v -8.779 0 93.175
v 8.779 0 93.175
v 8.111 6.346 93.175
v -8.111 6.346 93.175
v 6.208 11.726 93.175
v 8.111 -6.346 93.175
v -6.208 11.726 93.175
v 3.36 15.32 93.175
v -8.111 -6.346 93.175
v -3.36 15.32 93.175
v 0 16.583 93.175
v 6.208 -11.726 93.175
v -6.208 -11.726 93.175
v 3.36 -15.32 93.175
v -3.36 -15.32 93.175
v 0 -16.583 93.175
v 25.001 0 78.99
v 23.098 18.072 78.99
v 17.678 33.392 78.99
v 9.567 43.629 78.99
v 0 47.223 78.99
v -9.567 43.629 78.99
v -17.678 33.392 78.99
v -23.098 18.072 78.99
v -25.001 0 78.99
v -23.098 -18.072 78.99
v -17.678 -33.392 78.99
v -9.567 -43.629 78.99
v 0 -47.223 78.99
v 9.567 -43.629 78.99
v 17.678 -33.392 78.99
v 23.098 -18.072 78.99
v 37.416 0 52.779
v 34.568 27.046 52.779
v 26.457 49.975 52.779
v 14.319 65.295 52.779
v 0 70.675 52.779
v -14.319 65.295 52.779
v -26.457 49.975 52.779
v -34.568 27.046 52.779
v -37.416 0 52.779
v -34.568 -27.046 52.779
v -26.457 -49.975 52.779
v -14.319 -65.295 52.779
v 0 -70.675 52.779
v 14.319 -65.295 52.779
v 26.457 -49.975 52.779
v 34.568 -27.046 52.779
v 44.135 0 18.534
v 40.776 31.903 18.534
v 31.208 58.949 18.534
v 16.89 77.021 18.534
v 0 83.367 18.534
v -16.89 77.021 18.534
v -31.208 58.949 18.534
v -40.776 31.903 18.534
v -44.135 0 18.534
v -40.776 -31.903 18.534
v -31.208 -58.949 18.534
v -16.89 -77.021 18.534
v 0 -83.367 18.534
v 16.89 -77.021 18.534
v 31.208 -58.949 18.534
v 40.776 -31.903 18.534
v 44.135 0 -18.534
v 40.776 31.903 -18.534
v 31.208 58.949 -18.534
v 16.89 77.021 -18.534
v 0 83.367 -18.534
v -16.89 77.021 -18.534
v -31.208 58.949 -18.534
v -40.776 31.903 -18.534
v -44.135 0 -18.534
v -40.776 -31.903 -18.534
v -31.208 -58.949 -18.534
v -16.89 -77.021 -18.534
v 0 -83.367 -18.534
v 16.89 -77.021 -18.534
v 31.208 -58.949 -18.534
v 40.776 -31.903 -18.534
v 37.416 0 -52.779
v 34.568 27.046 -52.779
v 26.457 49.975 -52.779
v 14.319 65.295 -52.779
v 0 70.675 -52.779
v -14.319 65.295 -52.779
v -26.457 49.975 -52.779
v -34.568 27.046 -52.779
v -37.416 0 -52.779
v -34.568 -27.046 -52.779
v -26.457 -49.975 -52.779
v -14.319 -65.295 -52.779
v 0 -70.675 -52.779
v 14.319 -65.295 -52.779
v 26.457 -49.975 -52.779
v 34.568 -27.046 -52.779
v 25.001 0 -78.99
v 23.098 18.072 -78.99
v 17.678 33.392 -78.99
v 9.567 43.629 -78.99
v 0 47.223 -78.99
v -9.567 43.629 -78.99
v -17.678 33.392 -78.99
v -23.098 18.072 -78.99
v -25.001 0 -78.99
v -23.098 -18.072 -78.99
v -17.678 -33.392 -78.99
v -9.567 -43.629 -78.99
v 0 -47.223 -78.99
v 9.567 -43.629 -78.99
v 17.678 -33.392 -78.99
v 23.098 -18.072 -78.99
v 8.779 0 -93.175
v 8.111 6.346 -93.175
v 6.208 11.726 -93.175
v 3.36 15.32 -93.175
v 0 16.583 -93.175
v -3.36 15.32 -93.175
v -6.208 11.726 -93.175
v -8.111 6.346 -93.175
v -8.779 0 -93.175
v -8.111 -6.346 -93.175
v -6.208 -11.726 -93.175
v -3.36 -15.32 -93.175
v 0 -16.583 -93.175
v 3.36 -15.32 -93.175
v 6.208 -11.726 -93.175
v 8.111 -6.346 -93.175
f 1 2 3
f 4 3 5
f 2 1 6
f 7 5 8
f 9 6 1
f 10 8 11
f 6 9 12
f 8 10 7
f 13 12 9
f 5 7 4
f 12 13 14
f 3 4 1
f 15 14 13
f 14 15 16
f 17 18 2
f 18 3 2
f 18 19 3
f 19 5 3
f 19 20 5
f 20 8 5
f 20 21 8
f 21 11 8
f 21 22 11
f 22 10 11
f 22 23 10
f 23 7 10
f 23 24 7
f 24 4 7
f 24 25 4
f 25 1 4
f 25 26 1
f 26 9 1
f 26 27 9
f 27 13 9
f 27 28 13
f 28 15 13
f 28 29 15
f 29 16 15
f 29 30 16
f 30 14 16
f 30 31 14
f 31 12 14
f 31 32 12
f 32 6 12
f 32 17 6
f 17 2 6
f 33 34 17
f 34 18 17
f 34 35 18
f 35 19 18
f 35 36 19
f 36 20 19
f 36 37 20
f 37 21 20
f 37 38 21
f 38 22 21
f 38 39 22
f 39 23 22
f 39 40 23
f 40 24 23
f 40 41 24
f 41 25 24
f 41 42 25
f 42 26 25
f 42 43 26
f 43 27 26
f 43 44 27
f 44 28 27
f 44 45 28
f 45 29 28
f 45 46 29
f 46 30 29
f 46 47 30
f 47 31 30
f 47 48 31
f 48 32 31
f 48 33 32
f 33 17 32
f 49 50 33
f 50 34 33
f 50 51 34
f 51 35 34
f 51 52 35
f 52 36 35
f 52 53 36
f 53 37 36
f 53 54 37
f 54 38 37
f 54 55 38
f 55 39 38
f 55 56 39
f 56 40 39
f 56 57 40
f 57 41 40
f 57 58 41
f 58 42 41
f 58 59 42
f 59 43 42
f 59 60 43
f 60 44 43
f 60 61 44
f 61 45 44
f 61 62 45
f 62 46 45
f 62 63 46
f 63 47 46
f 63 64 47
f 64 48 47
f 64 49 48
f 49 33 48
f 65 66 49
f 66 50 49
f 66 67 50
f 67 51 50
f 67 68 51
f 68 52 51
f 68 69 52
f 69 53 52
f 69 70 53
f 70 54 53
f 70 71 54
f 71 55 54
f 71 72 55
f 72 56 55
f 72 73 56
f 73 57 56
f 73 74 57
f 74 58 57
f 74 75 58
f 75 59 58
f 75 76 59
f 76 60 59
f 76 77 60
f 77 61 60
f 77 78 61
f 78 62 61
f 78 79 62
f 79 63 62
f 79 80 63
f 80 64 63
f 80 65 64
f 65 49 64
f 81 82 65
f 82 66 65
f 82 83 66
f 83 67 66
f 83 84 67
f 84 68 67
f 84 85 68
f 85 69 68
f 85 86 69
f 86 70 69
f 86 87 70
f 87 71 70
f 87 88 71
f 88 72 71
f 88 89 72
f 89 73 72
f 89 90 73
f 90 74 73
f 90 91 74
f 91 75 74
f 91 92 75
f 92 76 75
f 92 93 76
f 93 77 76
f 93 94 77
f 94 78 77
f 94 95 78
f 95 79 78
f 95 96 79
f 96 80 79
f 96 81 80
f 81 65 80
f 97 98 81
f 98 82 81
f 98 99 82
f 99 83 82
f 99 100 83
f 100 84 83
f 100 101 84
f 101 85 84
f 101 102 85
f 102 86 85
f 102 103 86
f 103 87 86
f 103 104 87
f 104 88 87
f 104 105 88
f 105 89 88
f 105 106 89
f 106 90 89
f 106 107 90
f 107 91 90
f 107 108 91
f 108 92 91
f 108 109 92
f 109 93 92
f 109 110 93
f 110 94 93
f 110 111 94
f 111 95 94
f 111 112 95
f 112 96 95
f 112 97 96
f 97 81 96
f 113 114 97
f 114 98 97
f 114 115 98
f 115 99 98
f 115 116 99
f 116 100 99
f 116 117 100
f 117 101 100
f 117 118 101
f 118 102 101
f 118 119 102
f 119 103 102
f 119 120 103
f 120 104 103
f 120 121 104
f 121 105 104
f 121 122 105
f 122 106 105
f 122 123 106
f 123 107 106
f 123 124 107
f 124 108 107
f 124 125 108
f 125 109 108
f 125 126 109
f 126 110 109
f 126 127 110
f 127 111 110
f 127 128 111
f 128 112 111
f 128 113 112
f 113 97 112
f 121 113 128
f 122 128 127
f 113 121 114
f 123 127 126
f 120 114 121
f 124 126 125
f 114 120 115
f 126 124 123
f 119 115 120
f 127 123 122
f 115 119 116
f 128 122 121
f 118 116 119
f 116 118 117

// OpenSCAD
// Generated by SolidPython 1.0.1 on 2020-07-29 00:46:49


scale(v = [9, 17, 19]) {
	sphere(r = 5);
}
/***********************************************
*********      SolidPython code:      **********
************************************************
 
# import packages: SolidPython
from solid import *
from solid.utils import *
from itertools import chain, combinations, permutations


class Resize:

    def __init__(self, scad_file):
        self.scad_file = scad_file
        #self.scad_file = import_scad(scad_file)
        # cone/cylinder param:
        self.r1 = 0
        self.r2 = 0
        self.h = 0
        # rectangular prism param:
        self.w = 0
        self.l = 0
        # ellipse param:
        self.r = 0

    # import OpenScad code (file name corresponds to shape)


    # classify shape + parameters
    def assign(self, param1, param2, param3):
        if self.scad_file == 'cone.scad':
            self.r1 = param1
            self.r2 = param2
            self.h = param3
        elif self.scad_file == 'cylinder.scad':
            self.r1 = param1
            self.r2 = param2
            self.h = param3
        elif self.scad_file == 'rectangularPrism.scad':
            self.h = param1
            self.l = param2
            self.w = param3
        else:
            self.r = param1
            self.h = param2

    # resize parameters
    def iterate(self):
        x = range(3, 20, 2)
        i = 1
        if self.scad_file == 'cone.scad':
            tempList = list(permutations(x, 2))
            for temp in tempList:
                param1 = temp[0]
                param2 = temp[1]
                filepath = 'produced_scad_files/' + 'cone' + str(param1) + '_' + str(param2) + '_' + '.scad'
                scad_render_to_file(cylinder(h=param1, r1=param2, r2=0), filepath)

        elif self.scad_file == 'cylinder.scad':
            tempList = list(permutations(x, 3))
            for temp in tempList:
                param1 = temp[0]
                param2 = temp[1]
                filepath = 'produced_scad_files/' + 'cylinder' + str(param1) + '_' + str(param2) + '_' + '.scad'
                scad_render_to_file(cylinder(h=param1, r1=param2, r2=param2), filepath)

        elif self.scad_file == 'rectangularPrism.scad':
            tempList = list(permutations(x, 3))
            for temp in tempList:
                param1 = temp[0]
                param2 = temp[1]
                param3 = temp[2]
                filepath = 'produced_scad_files/' + 'rectangularPrism' + str(param1) + '_' + str(param2) + '_' + str(
                    param3) + '.scad'
                scad_render_to_file(cube(size=(param1, param2, param3)), filepath)

        elif self.scad_file == 'ellipse.scad':
            tempList = list(permutations(x, 4))
            for temp in tempList:
                param1 = temp[0]
                param2 = temp[1]
                param3 = temp[2]
                param4 = temp[3]
                filepath = 'produced_scad_files/' + 'ellipse' + str(param1) + '_' + str(param2) + '_' + str(param3) + '_' + str(param4) + '.scad'
                scad_render_to_file(scale([param1, param2, param3])(sphere(r=param4)), filepath)

    def render_to_scadfile(self):
        scad_render_to_file(scad, 'example.scad') 
 
************************************************/
